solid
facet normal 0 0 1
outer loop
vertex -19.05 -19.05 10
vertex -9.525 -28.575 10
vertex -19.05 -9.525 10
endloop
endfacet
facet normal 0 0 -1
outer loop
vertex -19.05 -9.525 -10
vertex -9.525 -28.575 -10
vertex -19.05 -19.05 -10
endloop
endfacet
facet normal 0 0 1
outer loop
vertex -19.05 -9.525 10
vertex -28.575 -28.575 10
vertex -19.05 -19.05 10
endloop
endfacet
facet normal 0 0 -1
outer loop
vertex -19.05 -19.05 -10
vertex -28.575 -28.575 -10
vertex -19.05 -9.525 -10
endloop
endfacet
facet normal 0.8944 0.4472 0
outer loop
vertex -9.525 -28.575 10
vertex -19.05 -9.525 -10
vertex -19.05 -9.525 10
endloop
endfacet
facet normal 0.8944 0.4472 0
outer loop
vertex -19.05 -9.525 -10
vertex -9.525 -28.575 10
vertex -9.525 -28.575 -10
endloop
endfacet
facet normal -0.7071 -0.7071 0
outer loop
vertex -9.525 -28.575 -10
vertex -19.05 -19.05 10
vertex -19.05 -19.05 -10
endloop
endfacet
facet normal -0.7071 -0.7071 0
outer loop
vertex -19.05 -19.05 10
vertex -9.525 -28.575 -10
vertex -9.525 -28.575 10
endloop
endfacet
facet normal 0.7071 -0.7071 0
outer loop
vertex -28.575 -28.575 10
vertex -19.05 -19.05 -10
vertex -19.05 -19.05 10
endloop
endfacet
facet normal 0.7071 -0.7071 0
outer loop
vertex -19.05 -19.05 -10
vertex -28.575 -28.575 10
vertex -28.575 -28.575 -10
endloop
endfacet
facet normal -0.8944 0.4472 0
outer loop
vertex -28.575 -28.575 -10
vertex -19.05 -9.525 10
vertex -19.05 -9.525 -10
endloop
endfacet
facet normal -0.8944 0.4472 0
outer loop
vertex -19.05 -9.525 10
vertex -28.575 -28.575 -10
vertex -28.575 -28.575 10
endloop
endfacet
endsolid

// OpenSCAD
polyhedron(
    points=[
    [-19.05, -9.525, 10],
    [-9.525, -28.575, 10],
    [-19.05, -19.05, 10],
    [-28.575, -28.575, 10],
    [-19.05, -9.525, -10],
    [-9.525, -28.575, -10],
    [-19.05, -19.05, -10],
    [-28.575, -28.575, -10],
    ],
    faces=[
        [0,1,2],
        [6,5,4],
        [2,3,0],
        [4,7,6],
        [0,4,5,1],
        [1,5,6,2],
        [2,6,7,3],
        [3,7,4,0],
    ]
);
